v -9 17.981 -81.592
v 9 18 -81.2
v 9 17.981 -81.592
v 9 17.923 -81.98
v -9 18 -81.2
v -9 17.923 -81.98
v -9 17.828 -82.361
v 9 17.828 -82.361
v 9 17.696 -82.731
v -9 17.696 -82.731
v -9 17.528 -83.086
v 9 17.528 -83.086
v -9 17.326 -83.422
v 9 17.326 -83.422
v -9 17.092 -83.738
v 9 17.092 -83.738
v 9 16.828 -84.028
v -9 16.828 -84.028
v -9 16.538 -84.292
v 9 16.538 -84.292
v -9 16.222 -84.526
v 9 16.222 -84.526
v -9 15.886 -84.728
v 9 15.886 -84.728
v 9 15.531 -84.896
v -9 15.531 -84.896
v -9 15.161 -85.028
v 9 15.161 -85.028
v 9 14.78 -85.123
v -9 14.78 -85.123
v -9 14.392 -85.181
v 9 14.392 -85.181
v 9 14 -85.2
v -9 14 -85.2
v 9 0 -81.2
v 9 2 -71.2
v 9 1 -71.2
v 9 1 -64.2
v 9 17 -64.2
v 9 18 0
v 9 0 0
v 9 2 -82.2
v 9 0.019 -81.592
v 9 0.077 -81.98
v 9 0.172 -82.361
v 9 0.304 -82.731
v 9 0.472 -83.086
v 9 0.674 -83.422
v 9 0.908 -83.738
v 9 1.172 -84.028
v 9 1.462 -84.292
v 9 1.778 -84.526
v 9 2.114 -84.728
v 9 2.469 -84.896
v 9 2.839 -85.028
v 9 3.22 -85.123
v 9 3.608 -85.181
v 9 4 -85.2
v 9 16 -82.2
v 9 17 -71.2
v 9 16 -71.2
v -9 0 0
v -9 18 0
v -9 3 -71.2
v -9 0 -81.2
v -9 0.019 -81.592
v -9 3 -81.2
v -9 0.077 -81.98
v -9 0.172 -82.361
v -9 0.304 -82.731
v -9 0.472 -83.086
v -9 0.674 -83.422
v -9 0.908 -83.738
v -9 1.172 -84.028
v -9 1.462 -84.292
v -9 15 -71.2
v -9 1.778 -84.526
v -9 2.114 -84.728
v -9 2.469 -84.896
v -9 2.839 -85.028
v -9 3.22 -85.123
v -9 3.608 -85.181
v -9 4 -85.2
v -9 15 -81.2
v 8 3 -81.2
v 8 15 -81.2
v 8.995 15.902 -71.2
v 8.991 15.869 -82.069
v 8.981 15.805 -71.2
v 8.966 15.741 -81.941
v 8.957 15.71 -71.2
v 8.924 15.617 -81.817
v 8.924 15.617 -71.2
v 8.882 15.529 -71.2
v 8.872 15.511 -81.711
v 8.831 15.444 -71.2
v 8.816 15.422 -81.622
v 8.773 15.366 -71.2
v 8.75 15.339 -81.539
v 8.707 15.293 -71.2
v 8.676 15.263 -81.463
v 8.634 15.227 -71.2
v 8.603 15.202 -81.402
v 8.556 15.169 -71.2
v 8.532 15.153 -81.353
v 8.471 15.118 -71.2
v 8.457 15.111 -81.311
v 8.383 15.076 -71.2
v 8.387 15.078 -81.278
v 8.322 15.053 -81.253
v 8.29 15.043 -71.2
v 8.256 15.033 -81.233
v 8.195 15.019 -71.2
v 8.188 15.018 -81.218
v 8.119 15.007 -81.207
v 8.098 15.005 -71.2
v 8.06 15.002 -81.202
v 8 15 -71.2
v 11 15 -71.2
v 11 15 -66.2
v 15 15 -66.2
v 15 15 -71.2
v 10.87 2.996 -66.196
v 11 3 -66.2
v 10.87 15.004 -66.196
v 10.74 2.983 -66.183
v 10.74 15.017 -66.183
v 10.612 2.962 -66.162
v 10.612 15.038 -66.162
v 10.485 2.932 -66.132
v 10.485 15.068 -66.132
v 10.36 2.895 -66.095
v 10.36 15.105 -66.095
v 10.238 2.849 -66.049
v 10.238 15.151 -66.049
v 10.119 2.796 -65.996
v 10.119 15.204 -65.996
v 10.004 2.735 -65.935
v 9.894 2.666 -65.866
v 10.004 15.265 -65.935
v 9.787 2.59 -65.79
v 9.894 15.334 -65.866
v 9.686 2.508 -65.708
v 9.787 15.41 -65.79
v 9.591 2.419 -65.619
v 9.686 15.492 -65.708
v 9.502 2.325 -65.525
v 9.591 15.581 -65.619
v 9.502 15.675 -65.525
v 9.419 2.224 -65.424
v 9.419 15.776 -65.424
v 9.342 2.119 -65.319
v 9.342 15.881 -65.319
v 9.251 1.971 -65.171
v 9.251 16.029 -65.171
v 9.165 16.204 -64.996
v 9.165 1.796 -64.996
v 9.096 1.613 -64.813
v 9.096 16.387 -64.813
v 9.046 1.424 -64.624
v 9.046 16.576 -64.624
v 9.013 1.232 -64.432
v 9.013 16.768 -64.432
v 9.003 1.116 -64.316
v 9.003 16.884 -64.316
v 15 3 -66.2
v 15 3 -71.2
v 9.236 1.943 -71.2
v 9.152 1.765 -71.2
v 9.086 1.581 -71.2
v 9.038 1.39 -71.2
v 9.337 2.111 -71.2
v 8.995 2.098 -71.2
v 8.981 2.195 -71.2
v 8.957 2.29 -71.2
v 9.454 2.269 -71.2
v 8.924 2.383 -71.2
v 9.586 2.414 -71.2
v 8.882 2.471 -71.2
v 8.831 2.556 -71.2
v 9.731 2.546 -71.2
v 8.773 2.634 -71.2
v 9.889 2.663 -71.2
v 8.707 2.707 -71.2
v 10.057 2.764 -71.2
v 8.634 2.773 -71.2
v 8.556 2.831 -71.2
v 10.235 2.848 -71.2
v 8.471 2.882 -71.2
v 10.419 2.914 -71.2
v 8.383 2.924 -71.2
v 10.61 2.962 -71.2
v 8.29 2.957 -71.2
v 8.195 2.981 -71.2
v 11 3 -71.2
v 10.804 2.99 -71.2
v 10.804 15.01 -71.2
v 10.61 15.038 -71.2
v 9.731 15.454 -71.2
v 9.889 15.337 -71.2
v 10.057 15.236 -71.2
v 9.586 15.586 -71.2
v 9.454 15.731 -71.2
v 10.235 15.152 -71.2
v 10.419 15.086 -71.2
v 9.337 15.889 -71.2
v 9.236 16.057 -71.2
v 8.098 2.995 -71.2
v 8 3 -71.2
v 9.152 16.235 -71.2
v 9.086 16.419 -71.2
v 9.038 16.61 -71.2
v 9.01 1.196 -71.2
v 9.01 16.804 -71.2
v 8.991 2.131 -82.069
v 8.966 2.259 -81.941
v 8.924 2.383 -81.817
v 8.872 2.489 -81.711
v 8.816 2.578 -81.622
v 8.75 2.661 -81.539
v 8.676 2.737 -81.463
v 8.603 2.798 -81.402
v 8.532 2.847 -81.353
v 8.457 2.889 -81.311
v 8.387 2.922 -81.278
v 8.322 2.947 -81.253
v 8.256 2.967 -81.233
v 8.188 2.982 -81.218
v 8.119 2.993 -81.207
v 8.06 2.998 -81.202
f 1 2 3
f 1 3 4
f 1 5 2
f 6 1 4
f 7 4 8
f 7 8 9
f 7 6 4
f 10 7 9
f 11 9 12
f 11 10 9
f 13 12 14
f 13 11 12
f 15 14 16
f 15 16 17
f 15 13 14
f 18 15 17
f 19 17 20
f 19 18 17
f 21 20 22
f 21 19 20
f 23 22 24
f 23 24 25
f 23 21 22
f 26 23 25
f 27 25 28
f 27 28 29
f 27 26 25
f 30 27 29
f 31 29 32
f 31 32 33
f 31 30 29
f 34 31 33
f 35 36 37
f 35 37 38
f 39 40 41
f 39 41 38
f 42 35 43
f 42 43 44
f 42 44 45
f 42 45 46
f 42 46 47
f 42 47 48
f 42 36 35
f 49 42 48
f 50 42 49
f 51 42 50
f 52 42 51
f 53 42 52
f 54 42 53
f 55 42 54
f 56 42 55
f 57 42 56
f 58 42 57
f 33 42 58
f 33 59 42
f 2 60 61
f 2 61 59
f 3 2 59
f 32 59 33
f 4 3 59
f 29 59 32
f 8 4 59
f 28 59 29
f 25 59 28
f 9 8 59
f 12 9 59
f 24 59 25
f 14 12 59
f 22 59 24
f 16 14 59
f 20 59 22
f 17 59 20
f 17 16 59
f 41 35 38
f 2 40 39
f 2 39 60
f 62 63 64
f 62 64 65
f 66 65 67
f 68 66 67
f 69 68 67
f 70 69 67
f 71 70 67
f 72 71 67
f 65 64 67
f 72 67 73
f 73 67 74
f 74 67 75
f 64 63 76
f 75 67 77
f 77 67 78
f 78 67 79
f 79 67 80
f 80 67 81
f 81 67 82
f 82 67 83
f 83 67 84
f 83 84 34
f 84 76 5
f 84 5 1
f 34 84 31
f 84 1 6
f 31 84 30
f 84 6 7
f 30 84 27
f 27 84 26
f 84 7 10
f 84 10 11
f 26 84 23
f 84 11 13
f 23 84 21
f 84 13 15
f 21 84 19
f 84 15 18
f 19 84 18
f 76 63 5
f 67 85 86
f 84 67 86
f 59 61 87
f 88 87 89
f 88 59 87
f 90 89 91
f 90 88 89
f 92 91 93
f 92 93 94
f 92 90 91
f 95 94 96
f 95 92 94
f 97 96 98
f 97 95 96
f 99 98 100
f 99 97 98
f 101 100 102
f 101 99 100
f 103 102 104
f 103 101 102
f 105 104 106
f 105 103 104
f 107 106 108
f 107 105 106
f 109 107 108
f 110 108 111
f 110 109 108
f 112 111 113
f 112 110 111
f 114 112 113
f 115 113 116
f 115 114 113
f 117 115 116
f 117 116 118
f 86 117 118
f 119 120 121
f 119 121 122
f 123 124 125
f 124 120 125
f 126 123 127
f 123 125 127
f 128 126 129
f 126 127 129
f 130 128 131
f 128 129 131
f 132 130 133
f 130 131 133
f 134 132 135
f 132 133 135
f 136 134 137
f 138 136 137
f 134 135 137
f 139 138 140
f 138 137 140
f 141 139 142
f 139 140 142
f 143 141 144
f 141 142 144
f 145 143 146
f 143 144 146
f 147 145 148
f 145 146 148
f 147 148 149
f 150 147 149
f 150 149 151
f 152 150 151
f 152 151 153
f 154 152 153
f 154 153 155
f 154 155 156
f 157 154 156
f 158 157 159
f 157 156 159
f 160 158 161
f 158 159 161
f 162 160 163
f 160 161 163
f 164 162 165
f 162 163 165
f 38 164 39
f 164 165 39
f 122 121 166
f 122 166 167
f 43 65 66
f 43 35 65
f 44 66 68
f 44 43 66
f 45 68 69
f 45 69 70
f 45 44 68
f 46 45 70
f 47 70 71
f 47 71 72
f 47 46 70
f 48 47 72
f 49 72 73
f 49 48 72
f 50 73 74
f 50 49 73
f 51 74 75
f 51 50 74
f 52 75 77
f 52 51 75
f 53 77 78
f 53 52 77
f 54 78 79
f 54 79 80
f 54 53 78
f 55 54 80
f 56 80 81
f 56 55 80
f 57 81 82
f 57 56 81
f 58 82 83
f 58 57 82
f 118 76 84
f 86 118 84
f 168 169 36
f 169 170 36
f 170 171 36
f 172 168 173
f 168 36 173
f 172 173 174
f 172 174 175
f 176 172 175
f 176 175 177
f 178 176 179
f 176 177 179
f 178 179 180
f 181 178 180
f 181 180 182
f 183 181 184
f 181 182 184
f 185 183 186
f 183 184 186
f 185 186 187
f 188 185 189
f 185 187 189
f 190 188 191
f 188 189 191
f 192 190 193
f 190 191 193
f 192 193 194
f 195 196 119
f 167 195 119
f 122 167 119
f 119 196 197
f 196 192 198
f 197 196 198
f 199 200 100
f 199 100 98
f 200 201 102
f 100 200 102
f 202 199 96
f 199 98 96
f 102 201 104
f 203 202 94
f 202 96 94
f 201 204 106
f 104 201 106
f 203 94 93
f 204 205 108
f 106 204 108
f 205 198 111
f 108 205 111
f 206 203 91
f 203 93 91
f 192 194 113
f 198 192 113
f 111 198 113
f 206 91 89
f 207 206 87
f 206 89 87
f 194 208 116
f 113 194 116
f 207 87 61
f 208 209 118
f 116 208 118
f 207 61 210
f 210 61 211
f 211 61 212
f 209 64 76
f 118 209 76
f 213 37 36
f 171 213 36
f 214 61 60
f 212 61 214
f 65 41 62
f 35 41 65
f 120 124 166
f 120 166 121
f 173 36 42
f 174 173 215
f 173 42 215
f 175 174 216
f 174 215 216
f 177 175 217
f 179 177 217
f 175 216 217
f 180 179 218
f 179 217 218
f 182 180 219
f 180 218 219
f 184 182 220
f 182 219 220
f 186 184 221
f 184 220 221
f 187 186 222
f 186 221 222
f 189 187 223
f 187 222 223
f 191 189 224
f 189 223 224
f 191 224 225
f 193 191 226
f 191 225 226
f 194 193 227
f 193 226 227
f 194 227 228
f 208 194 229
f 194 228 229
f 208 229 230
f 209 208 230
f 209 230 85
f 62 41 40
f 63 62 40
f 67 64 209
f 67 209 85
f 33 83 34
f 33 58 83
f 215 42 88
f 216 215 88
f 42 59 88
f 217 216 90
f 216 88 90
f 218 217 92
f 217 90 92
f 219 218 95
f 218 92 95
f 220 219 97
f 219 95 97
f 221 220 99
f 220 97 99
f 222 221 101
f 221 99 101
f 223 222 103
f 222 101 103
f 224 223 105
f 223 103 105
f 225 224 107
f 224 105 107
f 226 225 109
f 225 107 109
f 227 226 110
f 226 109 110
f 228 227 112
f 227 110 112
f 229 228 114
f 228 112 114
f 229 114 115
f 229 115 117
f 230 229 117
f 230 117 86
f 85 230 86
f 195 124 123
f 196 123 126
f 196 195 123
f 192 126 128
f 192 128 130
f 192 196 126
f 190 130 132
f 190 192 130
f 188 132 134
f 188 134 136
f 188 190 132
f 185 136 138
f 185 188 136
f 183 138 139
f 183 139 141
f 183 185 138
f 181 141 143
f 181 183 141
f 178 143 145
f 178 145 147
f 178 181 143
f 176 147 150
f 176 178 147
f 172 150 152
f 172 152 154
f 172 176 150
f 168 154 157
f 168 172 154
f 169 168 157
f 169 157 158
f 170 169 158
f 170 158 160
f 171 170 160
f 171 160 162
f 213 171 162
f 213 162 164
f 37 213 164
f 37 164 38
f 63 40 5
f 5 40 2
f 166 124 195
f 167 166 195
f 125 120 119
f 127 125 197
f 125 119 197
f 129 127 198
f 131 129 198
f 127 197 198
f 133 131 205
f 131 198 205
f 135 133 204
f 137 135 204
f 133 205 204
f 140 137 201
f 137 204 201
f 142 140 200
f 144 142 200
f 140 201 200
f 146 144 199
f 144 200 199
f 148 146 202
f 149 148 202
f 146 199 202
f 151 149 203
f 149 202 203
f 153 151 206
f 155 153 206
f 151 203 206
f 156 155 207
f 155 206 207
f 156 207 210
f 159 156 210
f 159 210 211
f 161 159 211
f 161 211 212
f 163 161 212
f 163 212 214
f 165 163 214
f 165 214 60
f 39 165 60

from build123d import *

# Parameters (mm, degrees)
SKETCH1_W           = 85.2
SKETCH1_H           = 18
SKETCH1_W_2         = 10
SKETCH1_H_2         = 12
BOSS_EXTRUDE1_DEPTH = 9
SKETCH2_W           = 5
SKETCH2_H           = 12
BOSS_EXTRUDE2_DEPTH = 6
FILLET1_R           = 2
FILLET2_R           = 1
FILLET3_R           = 4


with BuildPart() as part:
    # Sketch1 → Boss-Extrude1 (new, symmetric)
    with BuildSketch(Plane(origin=(0, 0, 0), x_dir=(0, 0, -1), z_dir=(1, 0, 0))):
        with Locations((42.6, 9)):
            Rectangle(SKETCH1_W, SKETCH1_H)
        with Locations((76.2, 9)):
            Rectangle(SKETCH1_W_2, SKETCH1_H_2, mode=Mode.SUBTRACT)
    extrude(amount=BOSS_EXTRUDE1_DEPTH, both=True)

    # Sketch2 → Boss-Extrude2 (add)
    with BuildSketch(Plane(origin=(9, 0, 0), x_dir=(0, 0, -1), z_dir=(1, 0, 0))):
        with Locations((68.7, 9)):
            Rectangle(SKETCH2_W, SKETCH2_H)
    extrude(amount=BOSS_EXTRUDE2_DEPTH)

    # Fillet1
    fillet1_edges = [part.edges().sort_by_distance(p)[0] for p in [
        (9, 15, -68.7),
        (9, 9, -66.2),
        (9, 3, -68.7),
    ]]
    fillet(fillet1_edges, radius=FILLET1_R)

    # Fillet2
    fillet2_edges = [part.edges().sort_by_distance(p)[0] for p in [
        (9, 9, -81.2),
        (9, 15, -76.2),
        (9, 3, -76.2),
    ]]
    fillet(fillet2_edges, radius=FILLET2_R)

    # Fillet3
    fillet3_edges = [part.edges().sort_by_distance(p)[0] for p in [
        (0, 18, -85.2),
        (0, 0, -85.2),
    ]]
    fillet(fillet3_edges, radius=FILLET3_R)


solid = part.part
